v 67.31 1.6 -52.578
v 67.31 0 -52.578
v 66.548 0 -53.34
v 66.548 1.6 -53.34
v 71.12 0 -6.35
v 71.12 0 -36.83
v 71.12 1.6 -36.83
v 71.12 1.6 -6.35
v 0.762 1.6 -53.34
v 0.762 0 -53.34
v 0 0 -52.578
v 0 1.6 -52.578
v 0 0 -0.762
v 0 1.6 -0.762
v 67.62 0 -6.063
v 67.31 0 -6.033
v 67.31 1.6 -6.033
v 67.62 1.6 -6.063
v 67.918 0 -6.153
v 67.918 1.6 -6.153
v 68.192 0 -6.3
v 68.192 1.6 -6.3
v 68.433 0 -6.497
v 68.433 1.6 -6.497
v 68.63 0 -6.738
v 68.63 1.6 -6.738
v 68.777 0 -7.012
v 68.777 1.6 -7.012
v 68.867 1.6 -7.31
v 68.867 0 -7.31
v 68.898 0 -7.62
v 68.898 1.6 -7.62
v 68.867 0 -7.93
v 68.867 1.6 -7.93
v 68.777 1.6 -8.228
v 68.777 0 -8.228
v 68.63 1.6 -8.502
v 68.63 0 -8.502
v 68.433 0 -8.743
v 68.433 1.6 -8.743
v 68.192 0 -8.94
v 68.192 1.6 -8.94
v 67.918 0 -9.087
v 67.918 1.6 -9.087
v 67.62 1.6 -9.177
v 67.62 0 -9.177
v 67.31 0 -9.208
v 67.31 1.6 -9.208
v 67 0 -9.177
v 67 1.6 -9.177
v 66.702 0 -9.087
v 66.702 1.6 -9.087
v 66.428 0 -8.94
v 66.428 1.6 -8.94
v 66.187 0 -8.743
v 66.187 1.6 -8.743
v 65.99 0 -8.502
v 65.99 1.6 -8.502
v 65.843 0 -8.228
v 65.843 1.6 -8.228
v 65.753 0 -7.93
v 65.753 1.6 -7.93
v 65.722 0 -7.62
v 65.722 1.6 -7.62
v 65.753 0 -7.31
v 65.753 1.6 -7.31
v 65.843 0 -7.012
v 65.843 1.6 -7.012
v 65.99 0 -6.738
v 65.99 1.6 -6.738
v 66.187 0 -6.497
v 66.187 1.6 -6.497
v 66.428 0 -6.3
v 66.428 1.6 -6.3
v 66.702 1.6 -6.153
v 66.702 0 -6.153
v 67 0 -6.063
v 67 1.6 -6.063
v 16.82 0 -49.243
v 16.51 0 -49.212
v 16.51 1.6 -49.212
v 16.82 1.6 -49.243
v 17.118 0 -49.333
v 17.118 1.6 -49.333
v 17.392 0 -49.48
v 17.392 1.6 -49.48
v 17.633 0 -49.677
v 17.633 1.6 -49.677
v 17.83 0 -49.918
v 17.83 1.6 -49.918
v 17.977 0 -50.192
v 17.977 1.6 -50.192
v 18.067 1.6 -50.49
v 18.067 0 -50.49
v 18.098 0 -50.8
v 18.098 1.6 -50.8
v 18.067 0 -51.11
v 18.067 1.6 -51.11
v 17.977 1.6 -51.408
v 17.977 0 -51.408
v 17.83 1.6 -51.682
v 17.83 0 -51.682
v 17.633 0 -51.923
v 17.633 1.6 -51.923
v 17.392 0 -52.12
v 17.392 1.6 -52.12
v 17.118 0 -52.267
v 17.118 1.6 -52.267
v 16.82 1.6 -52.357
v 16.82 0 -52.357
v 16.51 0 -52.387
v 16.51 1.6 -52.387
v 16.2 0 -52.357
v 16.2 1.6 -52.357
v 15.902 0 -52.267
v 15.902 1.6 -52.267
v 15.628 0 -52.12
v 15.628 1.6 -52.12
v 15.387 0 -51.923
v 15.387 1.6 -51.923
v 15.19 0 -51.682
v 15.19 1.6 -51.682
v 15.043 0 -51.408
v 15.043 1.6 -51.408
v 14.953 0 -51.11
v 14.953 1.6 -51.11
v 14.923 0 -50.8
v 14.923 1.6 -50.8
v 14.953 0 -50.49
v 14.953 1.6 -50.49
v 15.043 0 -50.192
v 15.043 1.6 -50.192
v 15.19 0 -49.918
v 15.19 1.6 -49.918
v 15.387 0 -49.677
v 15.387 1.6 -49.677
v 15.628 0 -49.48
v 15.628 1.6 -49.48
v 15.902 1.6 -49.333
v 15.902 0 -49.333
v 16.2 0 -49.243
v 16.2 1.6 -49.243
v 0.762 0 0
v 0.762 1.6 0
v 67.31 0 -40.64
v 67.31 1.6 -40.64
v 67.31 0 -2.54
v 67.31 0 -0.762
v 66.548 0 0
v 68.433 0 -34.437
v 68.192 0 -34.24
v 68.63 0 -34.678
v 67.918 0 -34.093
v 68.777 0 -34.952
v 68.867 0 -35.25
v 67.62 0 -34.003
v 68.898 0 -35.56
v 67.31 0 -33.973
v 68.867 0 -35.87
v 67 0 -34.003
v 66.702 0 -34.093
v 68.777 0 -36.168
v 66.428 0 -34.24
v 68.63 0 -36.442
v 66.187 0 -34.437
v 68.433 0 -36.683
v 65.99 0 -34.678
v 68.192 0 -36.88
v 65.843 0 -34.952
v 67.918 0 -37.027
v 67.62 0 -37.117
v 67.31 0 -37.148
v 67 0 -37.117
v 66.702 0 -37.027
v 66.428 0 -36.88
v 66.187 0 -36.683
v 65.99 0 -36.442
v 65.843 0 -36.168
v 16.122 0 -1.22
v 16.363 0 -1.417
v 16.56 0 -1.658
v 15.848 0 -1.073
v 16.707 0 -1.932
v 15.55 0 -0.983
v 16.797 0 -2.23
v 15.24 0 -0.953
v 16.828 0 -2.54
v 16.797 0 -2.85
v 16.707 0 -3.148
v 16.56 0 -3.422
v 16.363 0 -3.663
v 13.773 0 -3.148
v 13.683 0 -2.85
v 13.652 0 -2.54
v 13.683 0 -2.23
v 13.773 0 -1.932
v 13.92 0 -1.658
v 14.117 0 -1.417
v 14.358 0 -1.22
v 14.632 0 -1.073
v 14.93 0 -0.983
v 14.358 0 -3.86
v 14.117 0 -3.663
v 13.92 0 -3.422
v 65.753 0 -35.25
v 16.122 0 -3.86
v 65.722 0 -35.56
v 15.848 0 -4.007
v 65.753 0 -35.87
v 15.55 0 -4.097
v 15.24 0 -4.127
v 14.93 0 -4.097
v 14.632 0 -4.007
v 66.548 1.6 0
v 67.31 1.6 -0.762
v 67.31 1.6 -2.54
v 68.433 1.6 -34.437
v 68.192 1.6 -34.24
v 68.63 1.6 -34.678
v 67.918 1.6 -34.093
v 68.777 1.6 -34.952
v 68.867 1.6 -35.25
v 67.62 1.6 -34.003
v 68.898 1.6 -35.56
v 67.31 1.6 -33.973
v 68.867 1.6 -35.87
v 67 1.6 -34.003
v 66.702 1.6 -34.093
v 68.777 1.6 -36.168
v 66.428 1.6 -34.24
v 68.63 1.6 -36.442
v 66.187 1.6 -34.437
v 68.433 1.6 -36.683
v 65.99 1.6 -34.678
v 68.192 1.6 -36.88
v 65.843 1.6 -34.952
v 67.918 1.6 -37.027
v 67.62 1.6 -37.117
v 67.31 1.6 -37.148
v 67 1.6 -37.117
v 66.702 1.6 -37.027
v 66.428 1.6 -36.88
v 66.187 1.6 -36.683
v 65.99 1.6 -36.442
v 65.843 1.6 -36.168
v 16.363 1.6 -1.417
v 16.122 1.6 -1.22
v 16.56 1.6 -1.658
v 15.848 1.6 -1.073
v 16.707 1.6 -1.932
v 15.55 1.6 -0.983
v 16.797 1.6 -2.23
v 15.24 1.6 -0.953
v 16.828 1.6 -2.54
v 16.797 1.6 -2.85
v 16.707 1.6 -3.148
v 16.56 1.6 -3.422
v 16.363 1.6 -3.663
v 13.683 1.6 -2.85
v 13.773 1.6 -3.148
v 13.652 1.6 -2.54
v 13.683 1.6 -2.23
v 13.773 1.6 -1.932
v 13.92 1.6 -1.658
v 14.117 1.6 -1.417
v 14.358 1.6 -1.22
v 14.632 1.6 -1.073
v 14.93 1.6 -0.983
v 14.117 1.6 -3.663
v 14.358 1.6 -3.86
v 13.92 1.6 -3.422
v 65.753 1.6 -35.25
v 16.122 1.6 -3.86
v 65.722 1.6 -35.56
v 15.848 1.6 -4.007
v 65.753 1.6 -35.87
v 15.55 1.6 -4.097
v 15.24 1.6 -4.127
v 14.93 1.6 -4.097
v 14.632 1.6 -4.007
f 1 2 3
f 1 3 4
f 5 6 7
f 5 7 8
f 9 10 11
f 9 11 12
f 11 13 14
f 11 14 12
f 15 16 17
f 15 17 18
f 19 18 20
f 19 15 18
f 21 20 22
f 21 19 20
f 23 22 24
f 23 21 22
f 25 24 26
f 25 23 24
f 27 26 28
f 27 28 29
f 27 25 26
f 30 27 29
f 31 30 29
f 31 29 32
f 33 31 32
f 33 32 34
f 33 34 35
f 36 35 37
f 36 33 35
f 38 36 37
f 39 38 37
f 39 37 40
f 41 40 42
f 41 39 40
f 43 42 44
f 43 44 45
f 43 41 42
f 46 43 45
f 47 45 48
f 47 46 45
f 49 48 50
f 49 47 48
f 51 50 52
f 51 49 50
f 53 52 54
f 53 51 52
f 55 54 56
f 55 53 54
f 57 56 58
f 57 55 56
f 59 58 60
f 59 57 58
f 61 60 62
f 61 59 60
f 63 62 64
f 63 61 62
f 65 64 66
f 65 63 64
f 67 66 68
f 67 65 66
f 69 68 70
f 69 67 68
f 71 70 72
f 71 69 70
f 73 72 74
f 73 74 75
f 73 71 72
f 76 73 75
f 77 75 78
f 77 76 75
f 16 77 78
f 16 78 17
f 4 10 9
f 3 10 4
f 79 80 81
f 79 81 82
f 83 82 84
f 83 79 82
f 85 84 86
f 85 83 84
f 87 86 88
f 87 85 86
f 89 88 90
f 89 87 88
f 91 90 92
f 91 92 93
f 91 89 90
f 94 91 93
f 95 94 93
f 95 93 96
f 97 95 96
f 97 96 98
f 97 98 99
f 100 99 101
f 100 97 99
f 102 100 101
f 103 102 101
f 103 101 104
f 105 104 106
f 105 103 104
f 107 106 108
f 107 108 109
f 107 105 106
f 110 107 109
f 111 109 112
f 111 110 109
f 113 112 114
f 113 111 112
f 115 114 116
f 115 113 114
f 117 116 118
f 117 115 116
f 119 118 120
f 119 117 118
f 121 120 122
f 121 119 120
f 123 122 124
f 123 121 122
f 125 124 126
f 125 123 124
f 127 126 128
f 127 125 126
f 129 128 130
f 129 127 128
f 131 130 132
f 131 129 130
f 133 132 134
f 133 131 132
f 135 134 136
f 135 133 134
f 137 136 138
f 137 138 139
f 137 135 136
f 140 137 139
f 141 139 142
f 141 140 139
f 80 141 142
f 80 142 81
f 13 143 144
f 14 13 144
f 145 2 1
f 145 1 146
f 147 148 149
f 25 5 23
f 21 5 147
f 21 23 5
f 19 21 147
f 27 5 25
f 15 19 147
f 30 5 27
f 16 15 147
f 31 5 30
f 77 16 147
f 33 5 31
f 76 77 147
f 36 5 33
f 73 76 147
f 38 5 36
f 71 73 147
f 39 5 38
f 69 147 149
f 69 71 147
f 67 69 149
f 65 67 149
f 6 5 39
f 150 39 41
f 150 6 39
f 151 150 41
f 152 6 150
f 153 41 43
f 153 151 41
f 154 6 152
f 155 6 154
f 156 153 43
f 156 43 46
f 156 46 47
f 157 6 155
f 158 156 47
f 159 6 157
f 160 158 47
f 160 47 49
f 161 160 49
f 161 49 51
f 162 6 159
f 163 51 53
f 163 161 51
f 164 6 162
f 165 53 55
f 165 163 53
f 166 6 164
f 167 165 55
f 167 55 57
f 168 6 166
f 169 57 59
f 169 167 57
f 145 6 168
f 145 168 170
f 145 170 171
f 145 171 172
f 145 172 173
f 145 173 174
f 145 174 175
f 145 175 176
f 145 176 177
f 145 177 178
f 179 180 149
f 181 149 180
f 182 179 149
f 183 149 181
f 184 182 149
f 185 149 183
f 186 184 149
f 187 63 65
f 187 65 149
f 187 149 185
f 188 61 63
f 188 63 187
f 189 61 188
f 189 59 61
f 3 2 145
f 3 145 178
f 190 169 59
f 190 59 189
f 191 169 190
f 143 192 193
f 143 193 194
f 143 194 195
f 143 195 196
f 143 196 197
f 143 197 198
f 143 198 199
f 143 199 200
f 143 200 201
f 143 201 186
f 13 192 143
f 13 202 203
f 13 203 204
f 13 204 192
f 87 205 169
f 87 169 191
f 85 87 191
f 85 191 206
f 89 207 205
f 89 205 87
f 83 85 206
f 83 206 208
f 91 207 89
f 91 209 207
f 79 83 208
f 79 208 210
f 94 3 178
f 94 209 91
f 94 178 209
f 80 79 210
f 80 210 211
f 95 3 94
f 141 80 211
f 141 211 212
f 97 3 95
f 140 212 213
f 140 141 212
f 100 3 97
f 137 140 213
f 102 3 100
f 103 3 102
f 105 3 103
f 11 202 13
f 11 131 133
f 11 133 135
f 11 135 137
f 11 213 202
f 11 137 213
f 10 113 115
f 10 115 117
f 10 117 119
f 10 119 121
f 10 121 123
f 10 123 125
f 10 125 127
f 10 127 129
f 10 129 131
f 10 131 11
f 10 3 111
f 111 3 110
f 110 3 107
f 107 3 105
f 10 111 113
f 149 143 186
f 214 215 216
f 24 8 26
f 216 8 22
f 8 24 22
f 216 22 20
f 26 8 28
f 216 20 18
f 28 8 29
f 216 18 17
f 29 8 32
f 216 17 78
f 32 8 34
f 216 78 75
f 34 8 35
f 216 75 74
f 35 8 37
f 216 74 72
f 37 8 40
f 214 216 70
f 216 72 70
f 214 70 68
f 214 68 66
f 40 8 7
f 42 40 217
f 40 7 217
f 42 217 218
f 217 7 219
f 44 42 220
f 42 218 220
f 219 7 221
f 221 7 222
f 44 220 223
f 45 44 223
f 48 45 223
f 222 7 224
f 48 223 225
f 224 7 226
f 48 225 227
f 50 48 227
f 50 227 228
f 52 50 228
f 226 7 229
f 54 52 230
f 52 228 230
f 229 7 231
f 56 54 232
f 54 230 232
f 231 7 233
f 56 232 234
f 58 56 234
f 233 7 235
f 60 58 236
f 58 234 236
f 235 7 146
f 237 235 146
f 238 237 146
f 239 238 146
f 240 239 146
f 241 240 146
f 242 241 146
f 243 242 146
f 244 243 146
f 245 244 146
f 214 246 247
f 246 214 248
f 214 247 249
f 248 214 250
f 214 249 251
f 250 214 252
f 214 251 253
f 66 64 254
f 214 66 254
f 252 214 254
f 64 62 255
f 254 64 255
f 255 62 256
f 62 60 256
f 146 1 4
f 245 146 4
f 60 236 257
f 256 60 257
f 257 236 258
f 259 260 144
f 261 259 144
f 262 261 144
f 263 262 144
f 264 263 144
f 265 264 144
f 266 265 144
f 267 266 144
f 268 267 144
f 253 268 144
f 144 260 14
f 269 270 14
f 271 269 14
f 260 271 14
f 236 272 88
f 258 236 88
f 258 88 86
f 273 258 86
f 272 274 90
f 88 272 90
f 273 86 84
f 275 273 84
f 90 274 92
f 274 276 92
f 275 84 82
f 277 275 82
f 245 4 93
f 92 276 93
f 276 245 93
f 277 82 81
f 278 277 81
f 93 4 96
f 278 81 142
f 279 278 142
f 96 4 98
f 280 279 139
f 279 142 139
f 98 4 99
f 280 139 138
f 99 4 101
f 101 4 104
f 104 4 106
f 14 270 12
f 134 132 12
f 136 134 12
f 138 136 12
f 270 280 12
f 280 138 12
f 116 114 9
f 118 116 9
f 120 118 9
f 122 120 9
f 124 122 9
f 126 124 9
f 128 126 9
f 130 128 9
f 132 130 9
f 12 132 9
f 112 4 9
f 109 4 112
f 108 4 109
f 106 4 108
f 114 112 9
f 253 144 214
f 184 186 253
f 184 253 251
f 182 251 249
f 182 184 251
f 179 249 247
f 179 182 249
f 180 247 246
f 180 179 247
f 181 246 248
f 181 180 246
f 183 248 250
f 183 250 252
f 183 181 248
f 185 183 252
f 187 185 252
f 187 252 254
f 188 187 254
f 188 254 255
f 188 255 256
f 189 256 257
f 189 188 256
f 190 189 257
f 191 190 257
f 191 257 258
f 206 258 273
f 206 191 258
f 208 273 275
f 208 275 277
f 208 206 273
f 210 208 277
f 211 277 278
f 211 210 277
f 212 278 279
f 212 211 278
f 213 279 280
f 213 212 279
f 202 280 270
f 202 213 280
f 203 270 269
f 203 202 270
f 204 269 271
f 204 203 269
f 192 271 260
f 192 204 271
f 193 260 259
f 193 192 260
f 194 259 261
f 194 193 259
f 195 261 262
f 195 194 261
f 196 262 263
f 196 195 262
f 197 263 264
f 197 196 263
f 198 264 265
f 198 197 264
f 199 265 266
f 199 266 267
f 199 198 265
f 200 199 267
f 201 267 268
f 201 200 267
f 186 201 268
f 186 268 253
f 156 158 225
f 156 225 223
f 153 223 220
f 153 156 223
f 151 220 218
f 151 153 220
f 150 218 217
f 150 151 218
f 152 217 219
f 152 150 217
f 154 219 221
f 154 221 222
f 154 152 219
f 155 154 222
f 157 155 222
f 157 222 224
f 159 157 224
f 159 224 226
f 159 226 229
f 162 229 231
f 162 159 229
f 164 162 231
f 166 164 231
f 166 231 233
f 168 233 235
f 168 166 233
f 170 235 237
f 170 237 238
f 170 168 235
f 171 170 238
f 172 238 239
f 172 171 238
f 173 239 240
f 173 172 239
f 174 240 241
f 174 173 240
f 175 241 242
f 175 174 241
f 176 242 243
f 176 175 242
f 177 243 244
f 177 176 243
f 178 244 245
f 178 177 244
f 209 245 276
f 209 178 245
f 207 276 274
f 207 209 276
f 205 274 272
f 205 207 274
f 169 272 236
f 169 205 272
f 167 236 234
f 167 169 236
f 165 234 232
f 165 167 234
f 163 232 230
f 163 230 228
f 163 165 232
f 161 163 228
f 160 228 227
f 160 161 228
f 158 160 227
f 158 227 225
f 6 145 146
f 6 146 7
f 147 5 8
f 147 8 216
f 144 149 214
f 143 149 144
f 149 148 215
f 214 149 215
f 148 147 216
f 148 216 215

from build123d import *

# Parameters (mm, degrees)
SKETCH1_R           = 1.5875
BOSS_EXTRUDE1_DEPTH = 1.6002
CHAMFER1_SIZE       = 0.762


with BuildPart() as part:
    # Sketch1 → Boss-Extrude1 (new body)
    with BuildSketch(Plane(origin=(0, 0, 0), x_dir=(1, 0, 0), z_dir=(0, 1, 0))):
        Polygon((0, 0), (0, 53.34), (67.31, 53.34), (67.31, 40.64), (71.12, 36.83), (71.12, 6.35), (67.31, 2.54), (67.31, 0), align=None)
        with Locations(Location((16.51, 50.8, 0), (0, 0, 270))):
            Circle(SKETCH1_R, mode=Mode.SUBTRACT)
        with Locations(Location((15.24, 2.54, 0), (0, 0, 270))):
            Circle(SKETCH1_R, mode=Mode.SUBTRACT)
        with Locations(Location((67.31, 35.56, 0), (0, 0, 270))):
            Circle(SKETCH1_R, mode=Mode.SUBTRACT)
        with Locations(Location((67.31, 7.62, 0), (0, 0, 270))):
            Circle(SKETCH1_R, mode=Mode.SUBTRACT)
    extrude(amount=BOSS_EXTRUDE1_DEPTH)

    # Chamfer1
    chamfer1_edges = [part.edges().sort_by_distance(p)[0] for p in [
        (0, 0.8001, 0),
        (0, 0.8001, -53.34),
        (67.31, 0.8001, -53.34),
        (67.31, 0.8001, 0),
    ]]
    chamfer(chamfer1_edges, length=CHAMFER1_SIZE)


solid = part.part
